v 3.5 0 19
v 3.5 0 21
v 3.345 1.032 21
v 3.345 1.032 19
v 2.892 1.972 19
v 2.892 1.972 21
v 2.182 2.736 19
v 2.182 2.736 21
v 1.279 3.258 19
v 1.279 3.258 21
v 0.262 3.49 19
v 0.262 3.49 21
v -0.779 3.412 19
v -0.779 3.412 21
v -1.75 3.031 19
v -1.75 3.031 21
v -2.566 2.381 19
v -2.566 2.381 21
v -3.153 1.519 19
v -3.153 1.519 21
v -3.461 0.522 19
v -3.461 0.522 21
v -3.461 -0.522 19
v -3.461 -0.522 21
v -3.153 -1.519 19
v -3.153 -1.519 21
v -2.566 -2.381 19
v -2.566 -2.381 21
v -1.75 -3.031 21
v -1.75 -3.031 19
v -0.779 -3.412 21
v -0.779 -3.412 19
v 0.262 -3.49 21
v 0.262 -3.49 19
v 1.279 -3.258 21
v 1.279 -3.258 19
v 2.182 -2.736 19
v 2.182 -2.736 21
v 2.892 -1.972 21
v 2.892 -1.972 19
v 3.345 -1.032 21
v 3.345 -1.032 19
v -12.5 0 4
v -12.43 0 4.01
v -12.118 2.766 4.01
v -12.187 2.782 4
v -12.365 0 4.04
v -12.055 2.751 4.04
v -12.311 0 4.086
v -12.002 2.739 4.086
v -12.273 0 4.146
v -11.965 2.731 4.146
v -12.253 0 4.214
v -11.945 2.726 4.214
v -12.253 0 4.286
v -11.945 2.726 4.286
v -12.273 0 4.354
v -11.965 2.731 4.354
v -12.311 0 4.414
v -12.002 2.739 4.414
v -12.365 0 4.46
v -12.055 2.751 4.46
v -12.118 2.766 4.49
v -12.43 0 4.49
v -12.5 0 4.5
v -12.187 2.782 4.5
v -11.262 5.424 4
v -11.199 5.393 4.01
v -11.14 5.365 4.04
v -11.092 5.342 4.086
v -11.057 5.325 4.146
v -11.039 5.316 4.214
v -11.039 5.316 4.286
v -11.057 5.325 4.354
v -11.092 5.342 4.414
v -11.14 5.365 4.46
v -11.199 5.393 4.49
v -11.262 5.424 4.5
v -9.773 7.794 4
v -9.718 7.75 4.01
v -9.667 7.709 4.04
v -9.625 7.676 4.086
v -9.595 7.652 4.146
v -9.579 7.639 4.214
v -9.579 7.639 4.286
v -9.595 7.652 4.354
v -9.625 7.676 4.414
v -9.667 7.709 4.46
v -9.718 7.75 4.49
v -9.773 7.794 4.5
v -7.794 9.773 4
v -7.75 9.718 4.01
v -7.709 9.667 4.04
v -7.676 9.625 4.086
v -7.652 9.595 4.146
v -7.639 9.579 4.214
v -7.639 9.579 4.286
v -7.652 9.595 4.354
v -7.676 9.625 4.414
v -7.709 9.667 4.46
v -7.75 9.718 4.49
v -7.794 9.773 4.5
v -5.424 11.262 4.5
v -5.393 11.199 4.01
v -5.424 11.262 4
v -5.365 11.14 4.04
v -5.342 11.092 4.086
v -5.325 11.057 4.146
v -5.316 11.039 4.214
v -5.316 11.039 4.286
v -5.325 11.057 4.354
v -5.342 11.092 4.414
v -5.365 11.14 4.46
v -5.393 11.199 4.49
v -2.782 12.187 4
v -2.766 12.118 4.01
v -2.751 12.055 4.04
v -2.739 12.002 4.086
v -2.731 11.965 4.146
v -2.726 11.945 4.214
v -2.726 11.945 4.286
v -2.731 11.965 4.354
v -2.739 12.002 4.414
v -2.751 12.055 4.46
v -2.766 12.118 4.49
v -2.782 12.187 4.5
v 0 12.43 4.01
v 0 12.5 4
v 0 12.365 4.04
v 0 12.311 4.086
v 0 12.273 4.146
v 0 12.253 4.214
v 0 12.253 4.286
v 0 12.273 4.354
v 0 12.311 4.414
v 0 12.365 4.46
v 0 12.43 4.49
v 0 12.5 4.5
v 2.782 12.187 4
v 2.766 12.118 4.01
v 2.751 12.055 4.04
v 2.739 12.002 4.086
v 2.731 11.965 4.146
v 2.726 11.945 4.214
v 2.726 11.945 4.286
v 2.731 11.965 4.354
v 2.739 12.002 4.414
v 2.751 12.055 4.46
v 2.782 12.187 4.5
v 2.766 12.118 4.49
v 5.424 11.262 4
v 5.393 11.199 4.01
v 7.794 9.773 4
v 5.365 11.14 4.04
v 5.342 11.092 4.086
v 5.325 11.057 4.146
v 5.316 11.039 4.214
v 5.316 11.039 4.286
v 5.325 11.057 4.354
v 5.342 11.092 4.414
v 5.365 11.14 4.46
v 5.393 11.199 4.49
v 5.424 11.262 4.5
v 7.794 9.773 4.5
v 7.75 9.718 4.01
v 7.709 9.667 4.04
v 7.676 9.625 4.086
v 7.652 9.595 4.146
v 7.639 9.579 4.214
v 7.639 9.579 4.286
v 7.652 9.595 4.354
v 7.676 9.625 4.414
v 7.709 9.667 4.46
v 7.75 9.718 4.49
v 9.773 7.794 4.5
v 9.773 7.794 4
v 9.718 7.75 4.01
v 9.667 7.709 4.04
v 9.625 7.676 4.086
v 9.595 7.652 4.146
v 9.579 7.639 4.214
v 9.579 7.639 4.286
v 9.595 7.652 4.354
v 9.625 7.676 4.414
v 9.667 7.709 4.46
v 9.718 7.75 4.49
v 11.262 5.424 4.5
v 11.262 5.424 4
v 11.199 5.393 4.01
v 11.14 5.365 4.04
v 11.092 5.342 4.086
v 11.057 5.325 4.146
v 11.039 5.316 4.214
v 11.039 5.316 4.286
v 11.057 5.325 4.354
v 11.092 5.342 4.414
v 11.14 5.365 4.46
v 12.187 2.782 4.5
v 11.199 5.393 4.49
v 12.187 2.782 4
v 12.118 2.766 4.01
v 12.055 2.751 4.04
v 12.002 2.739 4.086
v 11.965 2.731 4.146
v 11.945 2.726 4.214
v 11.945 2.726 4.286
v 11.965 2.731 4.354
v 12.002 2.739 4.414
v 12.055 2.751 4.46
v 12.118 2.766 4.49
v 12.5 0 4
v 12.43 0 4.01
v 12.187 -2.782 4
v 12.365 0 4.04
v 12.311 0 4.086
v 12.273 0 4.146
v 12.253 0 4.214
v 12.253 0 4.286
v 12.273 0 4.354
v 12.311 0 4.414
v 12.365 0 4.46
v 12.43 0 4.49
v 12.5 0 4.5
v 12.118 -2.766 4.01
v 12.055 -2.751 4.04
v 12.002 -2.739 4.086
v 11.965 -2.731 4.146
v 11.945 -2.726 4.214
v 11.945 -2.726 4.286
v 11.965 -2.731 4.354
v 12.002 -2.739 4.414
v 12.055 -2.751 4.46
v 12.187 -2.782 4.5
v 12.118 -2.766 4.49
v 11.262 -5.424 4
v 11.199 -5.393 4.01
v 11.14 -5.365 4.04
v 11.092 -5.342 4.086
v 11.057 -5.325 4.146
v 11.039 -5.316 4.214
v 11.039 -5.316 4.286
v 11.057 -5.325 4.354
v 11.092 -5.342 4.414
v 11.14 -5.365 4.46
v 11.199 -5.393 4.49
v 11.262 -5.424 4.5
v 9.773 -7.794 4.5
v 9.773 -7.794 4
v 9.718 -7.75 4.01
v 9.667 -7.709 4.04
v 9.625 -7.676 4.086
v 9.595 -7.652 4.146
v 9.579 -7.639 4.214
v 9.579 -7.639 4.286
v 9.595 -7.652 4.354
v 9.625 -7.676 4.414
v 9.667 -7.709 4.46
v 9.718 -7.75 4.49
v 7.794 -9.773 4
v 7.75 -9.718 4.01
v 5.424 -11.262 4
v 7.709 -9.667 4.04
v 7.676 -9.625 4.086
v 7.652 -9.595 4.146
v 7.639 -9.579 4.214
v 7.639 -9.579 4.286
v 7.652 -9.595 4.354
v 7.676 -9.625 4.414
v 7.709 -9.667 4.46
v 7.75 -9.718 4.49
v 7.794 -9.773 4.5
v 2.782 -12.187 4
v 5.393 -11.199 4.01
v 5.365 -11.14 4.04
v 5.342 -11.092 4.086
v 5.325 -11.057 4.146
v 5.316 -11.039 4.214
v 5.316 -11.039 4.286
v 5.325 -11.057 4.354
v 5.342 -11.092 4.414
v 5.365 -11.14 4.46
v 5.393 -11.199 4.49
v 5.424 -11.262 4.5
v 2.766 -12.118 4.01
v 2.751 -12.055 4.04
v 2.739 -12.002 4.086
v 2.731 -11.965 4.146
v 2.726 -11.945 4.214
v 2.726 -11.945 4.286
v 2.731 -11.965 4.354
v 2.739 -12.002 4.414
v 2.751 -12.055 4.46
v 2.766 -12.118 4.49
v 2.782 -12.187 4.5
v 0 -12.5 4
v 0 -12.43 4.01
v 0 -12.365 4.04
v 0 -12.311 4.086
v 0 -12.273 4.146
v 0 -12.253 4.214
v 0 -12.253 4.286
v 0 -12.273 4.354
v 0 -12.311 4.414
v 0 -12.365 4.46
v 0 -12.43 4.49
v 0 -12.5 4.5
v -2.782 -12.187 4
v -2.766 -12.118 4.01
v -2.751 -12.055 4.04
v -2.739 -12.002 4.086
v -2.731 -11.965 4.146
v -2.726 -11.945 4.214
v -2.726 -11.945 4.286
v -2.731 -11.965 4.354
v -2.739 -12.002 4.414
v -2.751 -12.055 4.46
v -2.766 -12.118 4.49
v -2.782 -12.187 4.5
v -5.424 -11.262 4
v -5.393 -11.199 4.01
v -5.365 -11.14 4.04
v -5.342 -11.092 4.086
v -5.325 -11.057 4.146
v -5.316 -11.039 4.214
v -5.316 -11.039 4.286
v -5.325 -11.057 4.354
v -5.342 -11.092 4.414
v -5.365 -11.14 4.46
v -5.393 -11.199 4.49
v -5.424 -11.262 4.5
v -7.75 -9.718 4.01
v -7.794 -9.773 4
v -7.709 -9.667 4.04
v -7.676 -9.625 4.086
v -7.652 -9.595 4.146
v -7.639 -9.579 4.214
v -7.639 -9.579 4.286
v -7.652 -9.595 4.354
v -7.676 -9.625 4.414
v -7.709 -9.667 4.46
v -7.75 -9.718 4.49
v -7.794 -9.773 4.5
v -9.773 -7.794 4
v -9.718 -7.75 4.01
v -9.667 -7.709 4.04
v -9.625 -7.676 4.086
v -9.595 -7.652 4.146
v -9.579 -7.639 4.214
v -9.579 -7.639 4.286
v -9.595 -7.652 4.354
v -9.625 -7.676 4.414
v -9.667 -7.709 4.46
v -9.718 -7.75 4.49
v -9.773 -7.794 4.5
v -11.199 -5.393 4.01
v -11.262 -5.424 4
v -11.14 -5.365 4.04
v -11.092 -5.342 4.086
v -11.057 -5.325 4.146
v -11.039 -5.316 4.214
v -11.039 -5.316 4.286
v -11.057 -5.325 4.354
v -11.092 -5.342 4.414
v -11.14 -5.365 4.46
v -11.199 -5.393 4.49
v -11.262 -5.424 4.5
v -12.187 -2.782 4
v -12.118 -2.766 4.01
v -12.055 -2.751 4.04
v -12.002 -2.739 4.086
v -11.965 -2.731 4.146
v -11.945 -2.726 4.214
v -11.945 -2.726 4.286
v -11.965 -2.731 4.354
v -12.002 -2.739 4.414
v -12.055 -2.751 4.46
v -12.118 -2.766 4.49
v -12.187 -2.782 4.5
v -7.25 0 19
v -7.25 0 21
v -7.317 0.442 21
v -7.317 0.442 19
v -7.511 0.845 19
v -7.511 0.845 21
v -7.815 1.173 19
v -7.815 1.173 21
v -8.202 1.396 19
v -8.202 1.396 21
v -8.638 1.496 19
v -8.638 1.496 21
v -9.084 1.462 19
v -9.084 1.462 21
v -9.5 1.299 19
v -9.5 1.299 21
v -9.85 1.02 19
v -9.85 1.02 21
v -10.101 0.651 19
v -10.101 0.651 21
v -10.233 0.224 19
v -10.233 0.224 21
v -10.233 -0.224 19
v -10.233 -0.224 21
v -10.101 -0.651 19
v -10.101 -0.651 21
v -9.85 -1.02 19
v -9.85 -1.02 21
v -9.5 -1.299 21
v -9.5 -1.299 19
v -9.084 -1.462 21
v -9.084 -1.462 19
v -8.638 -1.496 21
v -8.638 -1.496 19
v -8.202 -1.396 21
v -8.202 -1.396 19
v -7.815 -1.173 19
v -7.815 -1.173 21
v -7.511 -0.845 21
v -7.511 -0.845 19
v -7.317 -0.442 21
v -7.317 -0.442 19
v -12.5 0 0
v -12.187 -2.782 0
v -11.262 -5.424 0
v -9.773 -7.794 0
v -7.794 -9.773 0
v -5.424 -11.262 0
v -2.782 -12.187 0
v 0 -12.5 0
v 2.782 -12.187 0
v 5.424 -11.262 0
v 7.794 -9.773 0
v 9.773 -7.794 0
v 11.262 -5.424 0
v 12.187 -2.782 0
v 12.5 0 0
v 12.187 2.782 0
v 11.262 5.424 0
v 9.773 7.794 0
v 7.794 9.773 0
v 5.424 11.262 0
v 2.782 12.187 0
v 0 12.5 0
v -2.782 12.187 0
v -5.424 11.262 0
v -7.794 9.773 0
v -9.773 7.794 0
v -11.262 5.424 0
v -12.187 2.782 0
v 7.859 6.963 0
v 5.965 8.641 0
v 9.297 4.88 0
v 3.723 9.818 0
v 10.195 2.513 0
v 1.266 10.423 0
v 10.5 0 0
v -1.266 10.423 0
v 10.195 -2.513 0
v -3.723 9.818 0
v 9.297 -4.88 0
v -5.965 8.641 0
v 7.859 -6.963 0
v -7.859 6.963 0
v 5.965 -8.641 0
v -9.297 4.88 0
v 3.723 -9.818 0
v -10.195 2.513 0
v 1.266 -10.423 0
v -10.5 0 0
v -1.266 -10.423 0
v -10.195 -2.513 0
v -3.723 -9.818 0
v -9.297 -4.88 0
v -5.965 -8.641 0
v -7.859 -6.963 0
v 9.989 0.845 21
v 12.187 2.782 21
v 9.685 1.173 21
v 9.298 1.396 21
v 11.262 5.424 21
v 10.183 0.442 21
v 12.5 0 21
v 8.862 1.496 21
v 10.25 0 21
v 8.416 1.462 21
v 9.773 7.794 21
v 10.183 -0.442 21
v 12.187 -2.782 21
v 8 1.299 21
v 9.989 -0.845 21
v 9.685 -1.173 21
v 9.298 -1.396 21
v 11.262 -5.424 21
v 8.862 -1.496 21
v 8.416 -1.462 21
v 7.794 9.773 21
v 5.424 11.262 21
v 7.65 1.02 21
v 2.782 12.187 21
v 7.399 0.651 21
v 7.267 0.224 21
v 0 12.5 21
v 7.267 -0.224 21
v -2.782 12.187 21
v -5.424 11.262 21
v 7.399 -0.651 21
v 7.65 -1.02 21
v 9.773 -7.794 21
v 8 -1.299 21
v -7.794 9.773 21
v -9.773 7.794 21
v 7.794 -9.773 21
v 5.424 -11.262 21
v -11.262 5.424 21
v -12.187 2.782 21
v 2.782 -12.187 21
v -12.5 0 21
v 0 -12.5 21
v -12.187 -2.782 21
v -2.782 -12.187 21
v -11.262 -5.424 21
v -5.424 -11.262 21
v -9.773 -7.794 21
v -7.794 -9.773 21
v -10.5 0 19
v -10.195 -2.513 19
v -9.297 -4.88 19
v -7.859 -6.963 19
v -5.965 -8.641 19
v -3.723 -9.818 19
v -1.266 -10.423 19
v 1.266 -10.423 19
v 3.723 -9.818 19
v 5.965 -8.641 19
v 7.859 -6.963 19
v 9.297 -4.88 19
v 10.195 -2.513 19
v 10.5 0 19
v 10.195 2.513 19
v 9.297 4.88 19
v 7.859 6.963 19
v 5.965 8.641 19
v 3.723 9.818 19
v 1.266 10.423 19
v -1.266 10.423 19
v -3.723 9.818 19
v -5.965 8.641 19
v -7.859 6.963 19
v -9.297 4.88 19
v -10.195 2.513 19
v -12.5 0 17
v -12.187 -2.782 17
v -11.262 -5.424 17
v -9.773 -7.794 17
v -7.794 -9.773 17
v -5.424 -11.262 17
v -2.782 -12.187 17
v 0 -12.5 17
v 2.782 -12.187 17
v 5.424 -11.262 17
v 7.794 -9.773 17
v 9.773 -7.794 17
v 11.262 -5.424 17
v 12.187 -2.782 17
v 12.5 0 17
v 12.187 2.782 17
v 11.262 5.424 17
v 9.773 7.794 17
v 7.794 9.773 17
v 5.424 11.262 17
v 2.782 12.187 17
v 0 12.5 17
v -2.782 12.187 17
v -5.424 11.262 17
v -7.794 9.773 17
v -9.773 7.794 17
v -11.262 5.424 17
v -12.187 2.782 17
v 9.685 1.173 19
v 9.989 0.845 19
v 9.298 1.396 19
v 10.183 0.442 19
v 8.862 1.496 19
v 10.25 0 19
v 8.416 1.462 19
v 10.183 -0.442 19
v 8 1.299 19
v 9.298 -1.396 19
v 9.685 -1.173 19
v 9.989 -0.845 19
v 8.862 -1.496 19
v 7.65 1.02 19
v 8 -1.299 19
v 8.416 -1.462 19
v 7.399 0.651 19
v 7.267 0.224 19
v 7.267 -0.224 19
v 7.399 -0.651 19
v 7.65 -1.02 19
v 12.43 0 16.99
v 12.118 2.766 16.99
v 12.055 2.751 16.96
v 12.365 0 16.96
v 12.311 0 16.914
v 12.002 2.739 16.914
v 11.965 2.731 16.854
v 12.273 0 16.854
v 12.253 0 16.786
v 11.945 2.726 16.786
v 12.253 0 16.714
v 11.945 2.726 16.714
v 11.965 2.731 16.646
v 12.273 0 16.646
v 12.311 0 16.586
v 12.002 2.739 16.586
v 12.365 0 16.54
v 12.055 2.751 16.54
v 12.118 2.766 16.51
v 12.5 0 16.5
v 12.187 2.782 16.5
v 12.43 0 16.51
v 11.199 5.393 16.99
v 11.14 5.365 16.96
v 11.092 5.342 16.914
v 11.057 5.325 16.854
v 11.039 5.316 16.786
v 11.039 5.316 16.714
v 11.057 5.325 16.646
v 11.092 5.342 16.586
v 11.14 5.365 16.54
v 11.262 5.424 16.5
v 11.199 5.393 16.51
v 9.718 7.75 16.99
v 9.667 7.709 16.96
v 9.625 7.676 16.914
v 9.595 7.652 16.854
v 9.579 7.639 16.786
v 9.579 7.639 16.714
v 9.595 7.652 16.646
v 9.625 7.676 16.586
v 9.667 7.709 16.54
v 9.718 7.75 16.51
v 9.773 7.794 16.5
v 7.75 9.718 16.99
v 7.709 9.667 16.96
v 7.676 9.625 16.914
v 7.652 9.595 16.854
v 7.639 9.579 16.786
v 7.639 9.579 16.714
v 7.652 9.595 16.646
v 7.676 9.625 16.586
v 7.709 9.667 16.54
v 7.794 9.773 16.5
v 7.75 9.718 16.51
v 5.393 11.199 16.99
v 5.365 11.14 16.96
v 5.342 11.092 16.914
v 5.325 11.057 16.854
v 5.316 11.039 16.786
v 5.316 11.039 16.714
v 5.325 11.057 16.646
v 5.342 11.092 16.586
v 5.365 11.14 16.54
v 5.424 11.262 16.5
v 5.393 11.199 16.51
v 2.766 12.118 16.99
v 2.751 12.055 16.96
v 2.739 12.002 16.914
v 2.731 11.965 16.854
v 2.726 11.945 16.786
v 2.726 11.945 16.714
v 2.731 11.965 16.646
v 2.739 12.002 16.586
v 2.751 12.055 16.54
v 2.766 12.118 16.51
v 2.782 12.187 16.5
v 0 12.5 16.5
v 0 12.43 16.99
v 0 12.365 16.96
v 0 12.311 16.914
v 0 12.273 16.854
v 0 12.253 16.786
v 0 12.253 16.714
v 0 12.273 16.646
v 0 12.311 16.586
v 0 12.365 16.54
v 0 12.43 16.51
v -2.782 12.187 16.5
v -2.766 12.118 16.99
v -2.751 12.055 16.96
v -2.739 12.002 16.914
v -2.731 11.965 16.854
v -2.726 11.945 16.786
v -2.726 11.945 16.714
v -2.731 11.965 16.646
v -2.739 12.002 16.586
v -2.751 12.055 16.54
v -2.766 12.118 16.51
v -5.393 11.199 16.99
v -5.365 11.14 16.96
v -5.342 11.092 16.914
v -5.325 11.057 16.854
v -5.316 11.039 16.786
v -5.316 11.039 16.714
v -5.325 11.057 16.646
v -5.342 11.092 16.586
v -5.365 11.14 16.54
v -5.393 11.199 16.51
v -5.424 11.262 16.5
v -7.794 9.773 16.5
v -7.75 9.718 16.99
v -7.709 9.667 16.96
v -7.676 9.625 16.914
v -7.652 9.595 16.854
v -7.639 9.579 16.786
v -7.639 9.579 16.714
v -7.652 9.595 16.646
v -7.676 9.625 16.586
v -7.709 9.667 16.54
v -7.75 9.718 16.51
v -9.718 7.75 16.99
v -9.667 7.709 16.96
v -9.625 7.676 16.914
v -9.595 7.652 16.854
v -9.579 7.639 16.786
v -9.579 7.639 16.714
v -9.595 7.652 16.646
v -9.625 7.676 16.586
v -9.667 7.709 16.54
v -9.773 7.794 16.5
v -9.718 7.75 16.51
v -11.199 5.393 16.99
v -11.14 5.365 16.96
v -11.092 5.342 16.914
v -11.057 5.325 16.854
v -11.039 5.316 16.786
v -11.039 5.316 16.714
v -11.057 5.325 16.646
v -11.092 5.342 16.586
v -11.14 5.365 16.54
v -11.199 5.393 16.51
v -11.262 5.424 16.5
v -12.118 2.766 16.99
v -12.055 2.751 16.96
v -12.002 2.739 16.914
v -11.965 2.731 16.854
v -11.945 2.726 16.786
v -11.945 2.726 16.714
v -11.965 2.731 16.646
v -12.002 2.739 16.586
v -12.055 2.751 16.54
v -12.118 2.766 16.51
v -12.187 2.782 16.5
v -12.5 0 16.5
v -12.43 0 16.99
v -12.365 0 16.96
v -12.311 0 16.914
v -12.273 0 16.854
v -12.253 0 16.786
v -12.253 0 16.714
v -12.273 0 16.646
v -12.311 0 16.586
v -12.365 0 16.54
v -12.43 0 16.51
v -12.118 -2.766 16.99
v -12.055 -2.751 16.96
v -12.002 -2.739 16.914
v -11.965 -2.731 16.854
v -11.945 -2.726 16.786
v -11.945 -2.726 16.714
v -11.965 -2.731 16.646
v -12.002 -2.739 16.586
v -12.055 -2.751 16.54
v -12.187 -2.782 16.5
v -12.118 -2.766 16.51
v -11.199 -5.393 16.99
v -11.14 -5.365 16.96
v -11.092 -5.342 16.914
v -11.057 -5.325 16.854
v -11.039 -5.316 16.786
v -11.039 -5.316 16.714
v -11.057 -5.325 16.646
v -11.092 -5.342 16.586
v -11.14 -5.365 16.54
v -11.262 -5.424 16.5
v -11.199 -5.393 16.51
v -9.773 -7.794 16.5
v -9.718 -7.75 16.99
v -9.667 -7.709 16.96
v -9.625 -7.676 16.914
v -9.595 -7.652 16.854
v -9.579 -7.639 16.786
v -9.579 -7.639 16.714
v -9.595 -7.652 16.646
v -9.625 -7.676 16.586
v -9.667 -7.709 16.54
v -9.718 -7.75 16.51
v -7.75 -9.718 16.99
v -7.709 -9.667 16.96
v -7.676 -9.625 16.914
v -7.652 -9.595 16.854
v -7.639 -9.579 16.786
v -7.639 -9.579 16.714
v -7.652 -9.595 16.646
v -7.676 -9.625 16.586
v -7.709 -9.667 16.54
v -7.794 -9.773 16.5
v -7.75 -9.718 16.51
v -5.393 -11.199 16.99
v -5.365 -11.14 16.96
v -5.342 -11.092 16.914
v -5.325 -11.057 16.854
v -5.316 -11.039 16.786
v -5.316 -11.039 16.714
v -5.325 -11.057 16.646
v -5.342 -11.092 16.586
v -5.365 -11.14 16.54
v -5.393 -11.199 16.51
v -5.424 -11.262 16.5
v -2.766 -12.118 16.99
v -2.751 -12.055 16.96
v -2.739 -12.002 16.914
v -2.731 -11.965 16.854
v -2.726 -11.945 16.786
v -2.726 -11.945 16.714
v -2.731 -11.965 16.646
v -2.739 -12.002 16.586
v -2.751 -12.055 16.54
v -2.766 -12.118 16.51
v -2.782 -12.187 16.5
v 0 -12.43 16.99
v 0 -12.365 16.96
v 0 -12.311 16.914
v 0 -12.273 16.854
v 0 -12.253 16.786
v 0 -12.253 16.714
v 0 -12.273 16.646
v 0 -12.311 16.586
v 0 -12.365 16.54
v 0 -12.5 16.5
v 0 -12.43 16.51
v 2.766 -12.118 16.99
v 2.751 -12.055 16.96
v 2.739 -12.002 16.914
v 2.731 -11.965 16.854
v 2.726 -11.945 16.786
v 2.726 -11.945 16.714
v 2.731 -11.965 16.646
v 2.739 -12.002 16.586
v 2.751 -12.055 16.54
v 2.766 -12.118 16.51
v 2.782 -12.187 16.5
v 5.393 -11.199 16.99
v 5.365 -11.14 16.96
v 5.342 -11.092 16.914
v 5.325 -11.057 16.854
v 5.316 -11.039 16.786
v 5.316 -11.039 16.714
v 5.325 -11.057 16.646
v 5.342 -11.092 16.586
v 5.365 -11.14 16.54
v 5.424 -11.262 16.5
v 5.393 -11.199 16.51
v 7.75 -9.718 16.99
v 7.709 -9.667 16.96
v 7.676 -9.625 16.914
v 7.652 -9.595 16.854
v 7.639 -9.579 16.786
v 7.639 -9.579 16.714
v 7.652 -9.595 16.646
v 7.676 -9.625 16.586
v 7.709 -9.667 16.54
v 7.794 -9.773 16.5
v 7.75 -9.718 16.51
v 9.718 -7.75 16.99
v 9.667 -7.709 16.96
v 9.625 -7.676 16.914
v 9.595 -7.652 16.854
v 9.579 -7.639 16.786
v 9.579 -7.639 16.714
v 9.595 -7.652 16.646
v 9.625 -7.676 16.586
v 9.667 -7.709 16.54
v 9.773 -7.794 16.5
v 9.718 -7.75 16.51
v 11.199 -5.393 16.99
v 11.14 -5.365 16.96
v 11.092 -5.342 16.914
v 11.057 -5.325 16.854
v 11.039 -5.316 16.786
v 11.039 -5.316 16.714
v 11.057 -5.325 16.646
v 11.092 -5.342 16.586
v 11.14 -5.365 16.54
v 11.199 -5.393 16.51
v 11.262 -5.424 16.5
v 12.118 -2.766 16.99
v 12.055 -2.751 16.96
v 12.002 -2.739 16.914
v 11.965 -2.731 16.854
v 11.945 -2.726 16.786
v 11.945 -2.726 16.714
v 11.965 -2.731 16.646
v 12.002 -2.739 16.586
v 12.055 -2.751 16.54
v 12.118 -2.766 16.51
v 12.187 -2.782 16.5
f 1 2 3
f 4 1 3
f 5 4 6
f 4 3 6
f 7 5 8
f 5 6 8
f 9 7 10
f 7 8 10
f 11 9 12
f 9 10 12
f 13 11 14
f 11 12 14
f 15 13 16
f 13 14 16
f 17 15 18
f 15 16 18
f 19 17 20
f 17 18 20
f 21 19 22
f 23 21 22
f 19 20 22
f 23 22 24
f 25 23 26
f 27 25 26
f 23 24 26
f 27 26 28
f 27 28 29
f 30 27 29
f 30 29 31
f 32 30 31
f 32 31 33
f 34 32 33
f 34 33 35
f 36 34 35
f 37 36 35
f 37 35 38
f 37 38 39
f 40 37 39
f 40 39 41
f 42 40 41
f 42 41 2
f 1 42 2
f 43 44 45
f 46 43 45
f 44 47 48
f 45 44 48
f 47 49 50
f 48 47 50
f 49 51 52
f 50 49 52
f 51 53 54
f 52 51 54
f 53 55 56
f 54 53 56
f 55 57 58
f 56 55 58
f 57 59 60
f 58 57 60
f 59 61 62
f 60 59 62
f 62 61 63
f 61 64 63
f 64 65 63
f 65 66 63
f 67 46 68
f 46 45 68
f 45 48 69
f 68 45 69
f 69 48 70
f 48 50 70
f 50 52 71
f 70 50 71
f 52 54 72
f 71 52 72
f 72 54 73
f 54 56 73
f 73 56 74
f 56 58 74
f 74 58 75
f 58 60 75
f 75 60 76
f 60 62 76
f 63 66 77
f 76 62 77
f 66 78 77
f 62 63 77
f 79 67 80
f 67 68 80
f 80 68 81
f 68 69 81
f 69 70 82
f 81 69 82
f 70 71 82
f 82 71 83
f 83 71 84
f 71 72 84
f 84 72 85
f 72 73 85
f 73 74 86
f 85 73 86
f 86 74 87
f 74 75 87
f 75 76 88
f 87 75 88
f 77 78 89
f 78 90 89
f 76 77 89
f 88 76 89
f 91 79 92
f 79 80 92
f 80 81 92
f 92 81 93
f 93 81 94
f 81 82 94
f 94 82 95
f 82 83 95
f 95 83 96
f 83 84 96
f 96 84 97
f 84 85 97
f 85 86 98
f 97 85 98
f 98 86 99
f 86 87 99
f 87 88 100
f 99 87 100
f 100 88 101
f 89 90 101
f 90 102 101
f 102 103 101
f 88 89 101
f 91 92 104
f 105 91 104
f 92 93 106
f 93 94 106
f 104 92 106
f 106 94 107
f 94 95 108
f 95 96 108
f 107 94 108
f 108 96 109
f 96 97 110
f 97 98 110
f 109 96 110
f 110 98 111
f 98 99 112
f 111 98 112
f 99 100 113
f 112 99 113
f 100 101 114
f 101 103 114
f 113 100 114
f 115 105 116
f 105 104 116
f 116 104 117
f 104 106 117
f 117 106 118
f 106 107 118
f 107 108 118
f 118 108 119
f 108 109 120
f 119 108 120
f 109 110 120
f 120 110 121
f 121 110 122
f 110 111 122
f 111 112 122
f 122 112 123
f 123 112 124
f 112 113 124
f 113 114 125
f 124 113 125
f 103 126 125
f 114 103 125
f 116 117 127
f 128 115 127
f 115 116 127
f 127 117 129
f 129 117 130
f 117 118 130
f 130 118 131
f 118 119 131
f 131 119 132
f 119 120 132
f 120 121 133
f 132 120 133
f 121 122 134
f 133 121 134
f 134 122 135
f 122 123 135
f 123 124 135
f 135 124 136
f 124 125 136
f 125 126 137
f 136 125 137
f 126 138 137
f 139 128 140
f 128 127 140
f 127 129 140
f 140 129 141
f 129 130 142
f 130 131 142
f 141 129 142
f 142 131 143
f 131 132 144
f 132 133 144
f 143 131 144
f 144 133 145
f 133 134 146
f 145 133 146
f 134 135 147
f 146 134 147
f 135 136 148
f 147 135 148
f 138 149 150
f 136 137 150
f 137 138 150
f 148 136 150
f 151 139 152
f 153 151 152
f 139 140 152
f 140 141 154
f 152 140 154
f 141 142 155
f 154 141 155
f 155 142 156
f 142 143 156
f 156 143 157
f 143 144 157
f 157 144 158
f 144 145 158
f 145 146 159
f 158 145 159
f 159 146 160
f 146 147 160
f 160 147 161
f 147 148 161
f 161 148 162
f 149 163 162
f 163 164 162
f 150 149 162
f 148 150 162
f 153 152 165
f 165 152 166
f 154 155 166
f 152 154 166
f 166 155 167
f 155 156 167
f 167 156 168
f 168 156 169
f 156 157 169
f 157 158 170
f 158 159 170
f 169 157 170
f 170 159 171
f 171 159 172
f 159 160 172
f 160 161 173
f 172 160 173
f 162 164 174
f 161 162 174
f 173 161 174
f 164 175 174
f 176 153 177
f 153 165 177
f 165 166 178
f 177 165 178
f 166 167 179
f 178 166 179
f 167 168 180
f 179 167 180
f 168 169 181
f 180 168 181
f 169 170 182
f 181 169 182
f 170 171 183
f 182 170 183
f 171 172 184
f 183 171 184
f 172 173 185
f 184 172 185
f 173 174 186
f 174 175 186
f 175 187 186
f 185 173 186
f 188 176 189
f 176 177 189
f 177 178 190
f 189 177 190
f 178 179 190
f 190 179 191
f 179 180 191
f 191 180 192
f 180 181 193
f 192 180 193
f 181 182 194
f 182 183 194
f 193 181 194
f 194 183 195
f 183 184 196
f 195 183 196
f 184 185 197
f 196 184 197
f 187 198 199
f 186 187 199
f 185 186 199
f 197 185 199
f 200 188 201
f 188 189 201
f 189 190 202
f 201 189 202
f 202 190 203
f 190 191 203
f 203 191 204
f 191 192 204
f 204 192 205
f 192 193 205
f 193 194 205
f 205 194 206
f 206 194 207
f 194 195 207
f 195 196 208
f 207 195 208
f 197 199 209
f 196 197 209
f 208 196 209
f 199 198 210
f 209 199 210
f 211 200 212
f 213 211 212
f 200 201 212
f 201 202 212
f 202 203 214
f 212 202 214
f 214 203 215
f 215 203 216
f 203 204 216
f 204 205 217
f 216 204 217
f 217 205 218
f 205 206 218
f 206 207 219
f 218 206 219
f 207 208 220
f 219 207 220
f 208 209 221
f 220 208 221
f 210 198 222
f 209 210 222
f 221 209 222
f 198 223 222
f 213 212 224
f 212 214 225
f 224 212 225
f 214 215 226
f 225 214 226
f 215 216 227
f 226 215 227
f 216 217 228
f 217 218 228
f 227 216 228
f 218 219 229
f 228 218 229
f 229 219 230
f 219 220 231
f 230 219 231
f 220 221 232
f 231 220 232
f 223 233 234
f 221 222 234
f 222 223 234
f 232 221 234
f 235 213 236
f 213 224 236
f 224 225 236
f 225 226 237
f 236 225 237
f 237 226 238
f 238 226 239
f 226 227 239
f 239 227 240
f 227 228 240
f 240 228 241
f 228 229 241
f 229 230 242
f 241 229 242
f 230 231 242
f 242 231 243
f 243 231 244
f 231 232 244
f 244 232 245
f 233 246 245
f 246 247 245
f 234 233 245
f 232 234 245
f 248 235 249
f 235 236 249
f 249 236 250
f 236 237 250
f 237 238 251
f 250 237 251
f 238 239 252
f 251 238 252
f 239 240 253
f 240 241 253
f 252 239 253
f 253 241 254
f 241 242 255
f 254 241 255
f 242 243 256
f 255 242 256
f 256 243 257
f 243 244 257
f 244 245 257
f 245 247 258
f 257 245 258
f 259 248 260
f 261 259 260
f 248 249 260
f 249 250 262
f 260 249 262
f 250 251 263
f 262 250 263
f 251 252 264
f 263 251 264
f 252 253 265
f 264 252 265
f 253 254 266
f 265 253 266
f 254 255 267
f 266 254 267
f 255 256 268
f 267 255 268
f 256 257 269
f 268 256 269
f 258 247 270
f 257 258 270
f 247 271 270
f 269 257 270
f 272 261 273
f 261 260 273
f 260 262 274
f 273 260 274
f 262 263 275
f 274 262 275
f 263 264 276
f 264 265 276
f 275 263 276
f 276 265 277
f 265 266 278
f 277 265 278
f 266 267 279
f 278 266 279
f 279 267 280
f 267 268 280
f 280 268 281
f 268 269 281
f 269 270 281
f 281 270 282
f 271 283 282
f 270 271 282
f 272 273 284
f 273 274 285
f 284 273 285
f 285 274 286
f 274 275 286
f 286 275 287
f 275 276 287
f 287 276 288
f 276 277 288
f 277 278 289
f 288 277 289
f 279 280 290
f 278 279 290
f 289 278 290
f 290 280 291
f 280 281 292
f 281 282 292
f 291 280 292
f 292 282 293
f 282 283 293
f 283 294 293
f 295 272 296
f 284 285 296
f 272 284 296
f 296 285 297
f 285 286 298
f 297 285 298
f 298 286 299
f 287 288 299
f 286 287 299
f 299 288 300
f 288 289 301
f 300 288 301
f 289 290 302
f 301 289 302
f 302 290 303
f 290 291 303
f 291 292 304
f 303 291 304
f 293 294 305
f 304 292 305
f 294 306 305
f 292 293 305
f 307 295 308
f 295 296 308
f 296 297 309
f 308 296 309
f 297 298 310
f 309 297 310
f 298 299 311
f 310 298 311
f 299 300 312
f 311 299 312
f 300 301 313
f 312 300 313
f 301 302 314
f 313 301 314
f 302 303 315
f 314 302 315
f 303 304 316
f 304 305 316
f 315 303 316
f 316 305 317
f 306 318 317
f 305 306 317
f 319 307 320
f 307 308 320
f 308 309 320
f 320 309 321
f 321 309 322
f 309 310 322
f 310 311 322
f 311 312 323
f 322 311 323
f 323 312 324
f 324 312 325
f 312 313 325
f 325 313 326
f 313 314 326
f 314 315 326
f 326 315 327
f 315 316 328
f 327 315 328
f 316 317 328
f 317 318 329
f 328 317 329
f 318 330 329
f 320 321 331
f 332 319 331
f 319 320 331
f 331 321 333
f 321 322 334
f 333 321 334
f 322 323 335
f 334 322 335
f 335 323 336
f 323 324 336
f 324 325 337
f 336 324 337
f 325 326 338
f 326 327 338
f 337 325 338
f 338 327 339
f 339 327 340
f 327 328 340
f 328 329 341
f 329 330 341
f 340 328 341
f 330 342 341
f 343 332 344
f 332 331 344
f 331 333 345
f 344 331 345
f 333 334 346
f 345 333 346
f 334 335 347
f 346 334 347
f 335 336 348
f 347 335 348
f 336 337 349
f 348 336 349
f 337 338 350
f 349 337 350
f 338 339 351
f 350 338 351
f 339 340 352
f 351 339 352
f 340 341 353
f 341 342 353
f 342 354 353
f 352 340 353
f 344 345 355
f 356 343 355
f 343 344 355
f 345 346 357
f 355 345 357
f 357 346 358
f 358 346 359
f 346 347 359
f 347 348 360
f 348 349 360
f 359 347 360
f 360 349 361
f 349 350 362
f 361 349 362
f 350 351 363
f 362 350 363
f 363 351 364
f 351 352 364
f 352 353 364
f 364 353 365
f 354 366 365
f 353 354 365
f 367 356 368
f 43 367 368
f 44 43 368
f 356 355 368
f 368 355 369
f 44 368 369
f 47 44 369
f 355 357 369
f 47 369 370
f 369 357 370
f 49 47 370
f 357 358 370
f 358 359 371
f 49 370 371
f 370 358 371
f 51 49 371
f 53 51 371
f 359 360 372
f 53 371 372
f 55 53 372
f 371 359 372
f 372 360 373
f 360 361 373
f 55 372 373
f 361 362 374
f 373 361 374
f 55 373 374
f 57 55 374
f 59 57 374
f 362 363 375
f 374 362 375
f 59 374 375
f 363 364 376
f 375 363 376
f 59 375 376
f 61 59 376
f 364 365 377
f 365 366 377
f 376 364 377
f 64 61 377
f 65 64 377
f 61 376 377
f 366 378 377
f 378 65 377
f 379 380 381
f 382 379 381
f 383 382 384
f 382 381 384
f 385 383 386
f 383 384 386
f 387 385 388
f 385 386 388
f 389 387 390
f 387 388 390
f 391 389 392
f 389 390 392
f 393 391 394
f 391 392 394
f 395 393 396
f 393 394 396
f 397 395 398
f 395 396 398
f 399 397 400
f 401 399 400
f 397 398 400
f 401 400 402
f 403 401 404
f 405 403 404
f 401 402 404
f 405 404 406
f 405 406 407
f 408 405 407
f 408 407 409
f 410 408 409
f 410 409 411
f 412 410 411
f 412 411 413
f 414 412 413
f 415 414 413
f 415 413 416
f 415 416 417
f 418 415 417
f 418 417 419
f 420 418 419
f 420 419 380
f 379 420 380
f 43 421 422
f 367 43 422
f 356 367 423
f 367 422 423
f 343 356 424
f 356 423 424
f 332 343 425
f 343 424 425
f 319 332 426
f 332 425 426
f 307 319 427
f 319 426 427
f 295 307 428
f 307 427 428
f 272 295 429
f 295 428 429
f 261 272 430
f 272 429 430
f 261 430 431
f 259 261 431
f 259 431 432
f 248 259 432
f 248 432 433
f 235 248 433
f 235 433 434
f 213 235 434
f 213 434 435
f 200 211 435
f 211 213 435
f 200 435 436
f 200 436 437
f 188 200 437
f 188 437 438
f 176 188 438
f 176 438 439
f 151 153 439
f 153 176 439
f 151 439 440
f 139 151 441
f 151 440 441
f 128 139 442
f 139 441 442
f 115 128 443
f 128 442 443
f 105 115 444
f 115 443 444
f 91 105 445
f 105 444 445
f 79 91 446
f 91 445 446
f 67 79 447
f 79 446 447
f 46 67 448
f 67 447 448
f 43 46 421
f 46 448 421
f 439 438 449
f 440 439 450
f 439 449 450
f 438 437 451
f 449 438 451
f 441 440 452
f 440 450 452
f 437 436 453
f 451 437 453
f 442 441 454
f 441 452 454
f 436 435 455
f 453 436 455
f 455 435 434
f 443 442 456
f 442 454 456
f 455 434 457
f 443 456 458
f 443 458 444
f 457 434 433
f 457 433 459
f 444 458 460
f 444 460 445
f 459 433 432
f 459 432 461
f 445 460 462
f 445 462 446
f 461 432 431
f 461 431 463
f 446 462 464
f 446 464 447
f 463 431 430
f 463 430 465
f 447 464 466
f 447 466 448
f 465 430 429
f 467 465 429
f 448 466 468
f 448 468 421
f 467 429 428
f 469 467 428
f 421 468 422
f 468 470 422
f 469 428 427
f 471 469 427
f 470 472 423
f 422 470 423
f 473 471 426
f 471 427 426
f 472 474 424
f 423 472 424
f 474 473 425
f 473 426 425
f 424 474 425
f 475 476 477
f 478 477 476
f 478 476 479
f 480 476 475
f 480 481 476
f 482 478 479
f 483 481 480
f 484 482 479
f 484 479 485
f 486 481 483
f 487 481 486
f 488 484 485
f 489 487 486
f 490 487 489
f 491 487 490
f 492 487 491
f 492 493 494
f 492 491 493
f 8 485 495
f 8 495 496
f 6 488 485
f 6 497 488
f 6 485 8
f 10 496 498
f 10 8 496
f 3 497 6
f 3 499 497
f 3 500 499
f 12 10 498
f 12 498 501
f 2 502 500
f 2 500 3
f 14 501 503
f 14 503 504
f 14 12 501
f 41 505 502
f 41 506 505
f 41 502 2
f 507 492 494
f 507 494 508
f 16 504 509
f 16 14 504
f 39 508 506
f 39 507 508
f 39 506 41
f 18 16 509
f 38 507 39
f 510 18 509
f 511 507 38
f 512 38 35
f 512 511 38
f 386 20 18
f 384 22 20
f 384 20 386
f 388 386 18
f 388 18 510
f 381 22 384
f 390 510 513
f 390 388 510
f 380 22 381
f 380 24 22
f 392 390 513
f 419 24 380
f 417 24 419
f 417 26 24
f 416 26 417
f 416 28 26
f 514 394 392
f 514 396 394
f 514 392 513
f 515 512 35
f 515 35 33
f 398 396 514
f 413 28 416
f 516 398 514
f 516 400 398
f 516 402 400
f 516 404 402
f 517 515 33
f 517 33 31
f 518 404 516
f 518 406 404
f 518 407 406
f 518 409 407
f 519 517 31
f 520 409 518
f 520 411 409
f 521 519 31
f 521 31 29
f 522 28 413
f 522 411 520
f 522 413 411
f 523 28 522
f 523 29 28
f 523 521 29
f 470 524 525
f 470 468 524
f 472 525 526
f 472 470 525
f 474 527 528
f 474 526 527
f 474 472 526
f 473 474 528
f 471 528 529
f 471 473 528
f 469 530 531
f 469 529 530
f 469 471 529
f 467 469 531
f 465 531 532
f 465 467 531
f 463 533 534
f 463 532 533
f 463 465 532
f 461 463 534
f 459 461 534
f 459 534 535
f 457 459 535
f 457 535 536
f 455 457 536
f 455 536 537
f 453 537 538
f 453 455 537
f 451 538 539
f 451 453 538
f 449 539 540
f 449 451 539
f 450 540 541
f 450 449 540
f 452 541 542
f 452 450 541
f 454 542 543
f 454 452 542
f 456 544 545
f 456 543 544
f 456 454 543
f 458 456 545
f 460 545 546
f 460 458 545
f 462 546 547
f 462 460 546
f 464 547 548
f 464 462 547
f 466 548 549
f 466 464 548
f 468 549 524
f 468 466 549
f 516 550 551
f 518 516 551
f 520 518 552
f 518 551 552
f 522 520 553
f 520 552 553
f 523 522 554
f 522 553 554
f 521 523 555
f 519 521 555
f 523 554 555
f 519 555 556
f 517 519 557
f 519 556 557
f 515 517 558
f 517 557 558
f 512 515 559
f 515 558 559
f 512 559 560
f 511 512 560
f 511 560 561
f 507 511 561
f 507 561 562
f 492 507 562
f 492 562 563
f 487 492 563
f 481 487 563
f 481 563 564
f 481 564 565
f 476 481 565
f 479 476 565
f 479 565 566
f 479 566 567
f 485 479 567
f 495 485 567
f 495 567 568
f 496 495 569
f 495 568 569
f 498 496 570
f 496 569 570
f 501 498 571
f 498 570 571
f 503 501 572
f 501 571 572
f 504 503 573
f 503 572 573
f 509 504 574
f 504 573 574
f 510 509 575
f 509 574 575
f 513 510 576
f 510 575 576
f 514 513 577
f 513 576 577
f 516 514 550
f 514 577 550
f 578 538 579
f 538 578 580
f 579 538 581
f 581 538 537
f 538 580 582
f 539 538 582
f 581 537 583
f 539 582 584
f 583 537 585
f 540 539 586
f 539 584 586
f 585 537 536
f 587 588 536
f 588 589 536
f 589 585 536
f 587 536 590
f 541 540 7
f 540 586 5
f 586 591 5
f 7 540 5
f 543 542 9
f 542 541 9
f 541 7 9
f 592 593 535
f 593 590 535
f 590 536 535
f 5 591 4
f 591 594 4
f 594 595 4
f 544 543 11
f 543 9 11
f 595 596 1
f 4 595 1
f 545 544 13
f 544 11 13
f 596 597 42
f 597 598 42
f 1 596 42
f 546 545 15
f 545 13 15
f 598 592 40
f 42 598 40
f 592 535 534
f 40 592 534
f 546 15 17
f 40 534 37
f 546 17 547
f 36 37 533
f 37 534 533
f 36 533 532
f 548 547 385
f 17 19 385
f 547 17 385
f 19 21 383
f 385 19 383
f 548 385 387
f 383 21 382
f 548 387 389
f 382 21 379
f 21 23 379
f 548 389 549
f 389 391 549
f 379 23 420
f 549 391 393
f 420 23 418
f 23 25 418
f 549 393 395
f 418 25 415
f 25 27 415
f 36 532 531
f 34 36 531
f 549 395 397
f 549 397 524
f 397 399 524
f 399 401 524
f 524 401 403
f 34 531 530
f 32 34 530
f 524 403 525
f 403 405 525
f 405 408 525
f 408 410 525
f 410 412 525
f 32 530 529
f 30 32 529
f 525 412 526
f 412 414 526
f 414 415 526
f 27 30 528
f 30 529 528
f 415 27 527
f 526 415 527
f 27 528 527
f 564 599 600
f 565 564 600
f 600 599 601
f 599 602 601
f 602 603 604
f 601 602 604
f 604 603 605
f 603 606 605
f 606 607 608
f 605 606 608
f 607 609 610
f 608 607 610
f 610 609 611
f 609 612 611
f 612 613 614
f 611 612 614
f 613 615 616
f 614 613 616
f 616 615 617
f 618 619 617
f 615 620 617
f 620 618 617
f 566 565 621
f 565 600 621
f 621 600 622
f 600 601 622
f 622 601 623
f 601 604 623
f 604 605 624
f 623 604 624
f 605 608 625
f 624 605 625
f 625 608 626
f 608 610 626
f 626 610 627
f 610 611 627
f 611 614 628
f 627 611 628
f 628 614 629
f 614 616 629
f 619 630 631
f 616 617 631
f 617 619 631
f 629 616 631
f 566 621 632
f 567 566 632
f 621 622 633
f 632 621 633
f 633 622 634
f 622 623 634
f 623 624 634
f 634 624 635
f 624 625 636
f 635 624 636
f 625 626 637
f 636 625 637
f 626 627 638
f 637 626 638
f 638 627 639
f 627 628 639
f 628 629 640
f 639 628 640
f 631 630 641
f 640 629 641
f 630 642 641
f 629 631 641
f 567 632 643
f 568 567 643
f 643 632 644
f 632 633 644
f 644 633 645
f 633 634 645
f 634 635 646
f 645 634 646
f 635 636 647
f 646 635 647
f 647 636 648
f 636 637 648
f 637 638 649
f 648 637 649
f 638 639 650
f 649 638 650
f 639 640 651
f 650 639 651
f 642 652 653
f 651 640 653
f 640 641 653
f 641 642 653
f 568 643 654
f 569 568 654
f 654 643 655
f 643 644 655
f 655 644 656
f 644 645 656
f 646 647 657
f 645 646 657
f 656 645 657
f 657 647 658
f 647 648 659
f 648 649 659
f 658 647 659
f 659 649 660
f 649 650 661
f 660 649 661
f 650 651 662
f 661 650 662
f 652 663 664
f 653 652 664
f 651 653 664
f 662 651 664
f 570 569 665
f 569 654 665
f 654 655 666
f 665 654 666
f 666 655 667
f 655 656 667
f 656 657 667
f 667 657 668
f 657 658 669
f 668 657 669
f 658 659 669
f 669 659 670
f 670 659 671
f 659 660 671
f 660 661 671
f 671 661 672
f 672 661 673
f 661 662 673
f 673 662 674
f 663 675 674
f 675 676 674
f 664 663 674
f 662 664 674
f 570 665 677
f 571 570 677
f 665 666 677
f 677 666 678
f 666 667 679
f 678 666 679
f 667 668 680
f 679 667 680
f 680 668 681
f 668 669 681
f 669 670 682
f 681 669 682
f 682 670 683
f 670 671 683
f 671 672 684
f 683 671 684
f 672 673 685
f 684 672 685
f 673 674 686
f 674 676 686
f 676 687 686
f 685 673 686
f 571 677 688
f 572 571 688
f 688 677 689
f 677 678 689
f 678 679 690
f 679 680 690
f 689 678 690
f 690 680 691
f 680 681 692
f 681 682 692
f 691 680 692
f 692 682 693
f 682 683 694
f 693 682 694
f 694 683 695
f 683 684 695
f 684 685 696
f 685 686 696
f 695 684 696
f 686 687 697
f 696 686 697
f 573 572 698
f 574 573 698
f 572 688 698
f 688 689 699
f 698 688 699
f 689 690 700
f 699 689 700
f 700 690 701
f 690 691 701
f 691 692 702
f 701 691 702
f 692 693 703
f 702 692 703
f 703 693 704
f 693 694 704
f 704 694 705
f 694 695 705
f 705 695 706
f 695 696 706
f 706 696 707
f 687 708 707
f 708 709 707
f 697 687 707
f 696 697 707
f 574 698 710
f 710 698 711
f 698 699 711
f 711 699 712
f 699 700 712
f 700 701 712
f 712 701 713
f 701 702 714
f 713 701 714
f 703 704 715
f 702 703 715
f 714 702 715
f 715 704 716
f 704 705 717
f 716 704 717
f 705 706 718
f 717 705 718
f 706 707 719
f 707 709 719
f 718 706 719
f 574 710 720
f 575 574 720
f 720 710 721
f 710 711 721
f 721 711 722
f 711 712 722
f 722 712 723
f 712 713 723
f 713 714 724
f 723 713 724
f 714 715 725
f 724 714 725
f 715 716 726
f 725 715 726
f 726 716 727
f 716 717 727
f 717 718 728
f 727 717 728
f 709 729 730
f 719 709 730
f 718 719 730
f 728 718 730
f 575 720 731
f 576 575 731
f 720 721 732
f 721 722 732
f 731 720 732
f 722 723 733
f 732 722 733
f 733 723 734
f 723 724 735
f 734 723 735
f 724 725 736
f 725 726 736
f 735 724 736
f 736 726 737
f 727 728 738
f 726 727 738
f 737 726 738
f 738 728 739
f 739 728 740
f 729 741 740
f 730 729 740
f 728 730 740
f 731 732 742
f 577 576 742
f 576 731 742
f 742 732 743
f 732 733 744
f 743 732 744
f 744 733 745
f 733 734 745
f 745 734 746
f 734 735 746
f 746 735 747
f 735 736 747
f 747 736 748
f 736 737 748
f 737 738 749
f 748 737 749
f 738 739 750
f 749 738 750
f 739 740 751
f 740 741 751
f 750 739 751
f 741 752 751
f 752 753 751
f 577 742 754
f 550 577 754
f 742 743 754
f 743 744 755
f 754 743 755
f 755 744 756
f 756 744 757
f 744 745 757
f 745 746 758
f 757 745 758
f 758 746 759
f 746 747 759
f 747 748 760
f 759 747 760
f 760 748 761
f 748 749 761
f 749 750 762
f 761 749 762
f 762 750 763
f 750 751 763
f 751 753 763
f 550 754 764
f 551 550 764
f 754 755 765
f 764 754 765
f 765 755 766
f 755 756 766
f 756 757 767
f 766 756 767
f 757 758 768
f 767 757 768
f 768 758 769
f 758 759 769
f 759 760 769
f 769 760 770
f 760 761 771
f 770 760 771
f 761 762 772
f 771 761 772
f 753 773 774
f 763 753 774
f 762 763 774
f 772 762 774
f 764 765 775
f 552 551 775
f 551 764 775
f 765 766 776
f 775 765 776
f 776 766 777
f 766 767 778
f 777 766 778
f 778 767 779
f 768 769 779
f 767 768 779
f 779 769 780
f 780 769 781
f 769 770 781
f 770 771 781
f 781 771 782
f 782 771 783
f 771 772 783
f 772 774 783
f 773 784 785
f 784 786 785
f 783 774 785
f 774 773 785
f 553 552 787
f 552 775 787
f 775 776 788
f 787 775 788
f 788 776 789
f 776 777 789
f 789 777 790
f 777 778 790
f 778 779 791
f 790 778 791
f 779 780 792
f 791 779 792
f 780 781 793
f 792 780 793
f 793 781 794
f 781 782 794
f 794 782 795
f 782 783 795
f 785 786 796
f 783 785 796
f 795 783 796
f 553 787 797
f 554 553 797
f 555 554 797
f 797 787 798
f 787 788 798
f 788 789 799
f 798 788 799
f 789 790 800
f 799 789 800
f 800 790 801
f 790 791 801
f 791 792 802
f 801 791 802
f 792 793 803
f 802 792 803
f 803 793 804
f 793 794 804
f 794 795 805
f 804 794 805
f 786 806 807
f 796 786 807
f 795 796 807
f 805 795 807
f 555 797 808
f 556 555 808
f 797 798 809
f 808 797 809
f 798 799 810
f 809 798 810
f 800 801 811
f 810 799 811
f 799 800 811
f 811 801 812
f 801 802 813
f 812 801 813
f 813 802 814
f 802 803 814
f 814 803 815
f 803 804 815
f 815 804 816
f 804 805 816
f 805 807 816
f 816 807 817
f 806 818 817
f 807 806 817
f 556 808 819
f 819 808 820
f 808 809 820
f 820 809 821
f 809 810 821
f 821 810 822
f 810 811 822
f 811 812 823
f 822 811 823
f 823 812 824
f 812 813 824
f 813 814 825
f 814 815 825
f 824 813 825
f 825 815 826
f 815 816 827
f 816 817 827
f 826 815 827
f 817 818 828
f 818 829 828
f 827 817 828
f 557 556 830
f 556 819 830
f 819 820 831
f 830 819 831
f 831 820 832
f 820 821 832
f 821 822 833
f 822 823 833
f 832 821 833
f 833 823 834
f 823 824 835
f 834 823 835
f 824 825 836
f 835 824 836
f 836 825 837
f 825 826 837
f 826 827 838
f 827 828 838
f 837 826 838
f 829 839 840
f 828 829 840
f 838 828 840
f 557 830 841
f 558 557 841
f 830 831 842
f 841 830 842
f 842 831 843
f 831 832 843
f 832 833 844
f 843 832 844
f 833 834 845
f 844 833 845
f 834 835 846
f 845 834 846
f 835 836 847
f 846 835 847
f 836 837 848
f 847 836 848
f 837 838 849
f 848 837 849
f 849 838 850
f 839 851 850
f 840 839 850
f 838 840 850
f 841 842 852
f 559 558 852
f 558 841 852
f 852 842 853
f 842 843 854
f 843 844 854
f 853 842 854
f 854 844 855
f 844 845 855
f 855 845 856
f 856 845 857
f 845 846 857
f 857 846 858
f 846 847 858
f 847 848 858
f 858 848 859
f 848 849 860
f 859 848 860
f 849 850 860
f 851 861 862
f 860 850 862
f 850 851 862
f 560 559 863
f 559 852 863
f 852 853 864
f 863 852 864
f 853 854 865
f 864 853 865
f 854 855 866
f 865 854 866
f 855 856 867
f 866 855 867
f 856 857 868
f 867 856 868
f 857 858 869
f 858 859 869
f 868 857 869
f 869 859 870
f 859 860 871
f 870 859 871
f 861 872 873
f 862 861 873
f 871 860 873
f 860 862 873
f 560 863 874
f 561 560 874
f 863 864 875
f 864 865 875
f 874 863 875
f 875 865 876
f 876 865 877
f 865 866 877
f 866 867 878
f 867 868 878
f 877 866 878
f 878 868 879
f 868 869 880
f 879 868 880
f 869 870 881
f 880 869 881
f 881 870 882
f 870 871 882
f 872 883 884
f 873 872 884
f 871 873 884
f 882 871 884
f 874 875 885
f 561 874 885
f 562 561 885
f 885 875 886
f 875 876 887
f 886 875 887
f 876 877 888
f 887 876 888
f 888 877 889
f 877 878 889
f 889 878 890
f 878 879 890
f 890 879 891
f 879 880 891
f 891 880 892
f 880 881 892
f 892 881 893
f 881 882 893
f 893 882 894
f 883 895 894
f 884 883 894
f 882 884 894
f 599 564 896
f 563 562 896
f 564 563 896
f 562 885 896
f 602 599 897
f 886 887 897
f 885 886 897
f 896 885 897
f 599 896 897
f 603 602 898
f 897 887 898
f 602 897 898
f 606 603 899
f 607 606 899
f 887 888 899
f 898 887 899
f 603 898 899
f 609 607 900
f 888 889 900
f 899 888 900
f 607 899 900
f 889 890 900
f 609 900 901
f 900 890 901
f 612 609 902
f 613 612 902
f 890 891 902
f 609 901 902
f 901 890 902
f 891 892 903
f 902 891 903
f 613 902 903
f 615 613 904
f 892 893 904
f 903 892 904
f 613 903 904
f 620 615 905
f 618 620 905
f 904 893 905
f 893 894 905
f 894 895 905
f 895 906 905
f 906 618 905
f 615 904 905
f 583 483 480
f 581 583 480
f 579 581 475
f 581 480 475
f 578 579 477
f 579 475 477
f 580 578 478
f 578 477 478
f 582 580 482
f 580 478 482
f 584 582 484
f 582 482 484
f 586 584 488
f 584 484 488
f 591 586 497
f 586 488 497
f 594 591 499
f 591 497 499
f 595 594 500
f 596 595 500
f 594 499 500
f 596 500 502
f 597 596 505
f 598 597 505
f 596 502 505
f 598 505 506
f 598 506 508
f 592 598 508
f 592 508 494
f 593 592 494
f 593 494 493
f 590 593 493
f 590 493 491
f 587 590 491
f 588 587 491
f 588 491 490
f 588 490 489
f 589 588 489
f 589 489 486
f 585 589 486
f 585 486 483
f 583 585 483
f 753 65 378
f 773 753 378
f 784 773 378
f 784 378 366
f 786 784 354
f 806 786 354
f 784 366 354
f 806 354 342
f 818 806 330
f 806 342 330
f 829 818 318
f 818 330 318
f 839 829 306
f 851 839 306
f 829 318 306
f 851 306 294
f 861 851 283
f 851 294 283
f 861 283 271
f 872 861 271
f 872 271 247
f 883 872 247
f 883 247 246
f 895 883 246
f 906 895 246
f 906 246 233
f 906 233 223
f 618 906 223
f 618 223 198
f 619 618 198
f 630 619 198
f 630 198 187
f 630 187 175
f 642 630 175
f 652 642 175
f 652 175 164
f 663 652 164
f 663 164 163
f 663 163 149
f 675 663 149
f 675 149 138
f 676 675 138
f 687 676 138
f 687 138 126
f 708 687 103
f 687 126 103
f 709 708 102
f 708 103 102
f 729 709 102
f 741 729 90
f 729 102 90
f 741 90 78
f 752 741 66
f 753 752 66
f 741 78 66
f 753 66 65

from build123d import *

# Parameters (mm, degrees)
SKETCH1_R           = 12.5
BOSS_EXTRUDE1_DEPTH = 21
SHELL1_T            = -2
SKETCH3_R           = 3.5
CUT_EXTRUDE1_DEPTH  = 28.449954463
SKETCH4_R           = 1.5
CUT_EXTRUDE2_DEPTH  = 28.449954463
SKETCH9_R           = 0.25
SKETCH8_R           = 0.25


with BuildPart() as part:
    # Sketch1 → Boss-Extrude1 (new body)
    with BuildSketch(Plane.XY):
        with Locations(Location((0, 0, 0), (0, 0, 180))):
            Circle(SKETCH1_R)
    extrude(amount=BOSS_EXTRUDE1_DEPTH)

    # Shell1
    shell1_openings = [part.faces().sort_by_distance(p)[0] for p in [
        (0, 0, 0),
    ]]
    offset(amount=SHELL1_T, openings=shell1_openings, kind=Kind.INTERSECTION)

    # Sketch3 → Cut-Extrude1 (cut, through all)
    with BuildSketch(Plane.XY.offset(21)):
        Circle(SKETCH3_R)
    extrude(amount=-CUT_EXTRUDE1_DEPTH, mode=Mode.SUBTRACT)

    # Sketch4 → Cut-Extrude2 (cut, through all)
    with BuildSketch(Plane.XY.offset(21)):
        with Locations((8.75, 0)):
            Circle(SKETCH4_R)
        with Locations((-8.75, 0)):
            Circle(SKETCH4_R)
    extrude(amount=-CUT_EXTRUDE2_DEPTH, mode=Mode.SUBTRACT)

    # Cut-Sweep1: sweep along a path in Sketch6
    with BuildLine(Plane.XY.offset(16.75)) as cut_sweep1_path:
        CenterArc((0, 0), 12.5, 0, 360)
    # Sketch9 → Cut-Sweep1 (sweep, cut)
    with BuildSketch(Plane(origin=(0, 0, 0), x_dir=(0, 0, -1), z_dir=(1, 0, 0))):
        with Locations((-16.75, 12.5)):
            Circle(SKETCH9_R)
    sweep(path=cut_sweep1_path.line, mode=Mode.SUBTRACT)

    # Cut-Sweep2: sweep along a path in Sketch7
    with BuildLine(Plane(origin=(0, 0, 4.25), x_dir=(-1, 0, 0), z_dir=(0, 0, -1))) as cut_sweep2_path:
        CenterArc((0, 0), 12.5, 0, 360)
    # Sketch8 → Cut-Sweep2 (sweep, cut)
    with BuildSketch(Plane(origin=(0, 0, 0), x_dir=(0, 0, -1), z_dir=(1, 0, 0))):
        with Locations((-4.25, 12.5)):
            Circle(SKETCH8_R)
    sweep(path=cut_sweep2_path.line, mode=Mode.SUBTRACT)


solid = part.part
